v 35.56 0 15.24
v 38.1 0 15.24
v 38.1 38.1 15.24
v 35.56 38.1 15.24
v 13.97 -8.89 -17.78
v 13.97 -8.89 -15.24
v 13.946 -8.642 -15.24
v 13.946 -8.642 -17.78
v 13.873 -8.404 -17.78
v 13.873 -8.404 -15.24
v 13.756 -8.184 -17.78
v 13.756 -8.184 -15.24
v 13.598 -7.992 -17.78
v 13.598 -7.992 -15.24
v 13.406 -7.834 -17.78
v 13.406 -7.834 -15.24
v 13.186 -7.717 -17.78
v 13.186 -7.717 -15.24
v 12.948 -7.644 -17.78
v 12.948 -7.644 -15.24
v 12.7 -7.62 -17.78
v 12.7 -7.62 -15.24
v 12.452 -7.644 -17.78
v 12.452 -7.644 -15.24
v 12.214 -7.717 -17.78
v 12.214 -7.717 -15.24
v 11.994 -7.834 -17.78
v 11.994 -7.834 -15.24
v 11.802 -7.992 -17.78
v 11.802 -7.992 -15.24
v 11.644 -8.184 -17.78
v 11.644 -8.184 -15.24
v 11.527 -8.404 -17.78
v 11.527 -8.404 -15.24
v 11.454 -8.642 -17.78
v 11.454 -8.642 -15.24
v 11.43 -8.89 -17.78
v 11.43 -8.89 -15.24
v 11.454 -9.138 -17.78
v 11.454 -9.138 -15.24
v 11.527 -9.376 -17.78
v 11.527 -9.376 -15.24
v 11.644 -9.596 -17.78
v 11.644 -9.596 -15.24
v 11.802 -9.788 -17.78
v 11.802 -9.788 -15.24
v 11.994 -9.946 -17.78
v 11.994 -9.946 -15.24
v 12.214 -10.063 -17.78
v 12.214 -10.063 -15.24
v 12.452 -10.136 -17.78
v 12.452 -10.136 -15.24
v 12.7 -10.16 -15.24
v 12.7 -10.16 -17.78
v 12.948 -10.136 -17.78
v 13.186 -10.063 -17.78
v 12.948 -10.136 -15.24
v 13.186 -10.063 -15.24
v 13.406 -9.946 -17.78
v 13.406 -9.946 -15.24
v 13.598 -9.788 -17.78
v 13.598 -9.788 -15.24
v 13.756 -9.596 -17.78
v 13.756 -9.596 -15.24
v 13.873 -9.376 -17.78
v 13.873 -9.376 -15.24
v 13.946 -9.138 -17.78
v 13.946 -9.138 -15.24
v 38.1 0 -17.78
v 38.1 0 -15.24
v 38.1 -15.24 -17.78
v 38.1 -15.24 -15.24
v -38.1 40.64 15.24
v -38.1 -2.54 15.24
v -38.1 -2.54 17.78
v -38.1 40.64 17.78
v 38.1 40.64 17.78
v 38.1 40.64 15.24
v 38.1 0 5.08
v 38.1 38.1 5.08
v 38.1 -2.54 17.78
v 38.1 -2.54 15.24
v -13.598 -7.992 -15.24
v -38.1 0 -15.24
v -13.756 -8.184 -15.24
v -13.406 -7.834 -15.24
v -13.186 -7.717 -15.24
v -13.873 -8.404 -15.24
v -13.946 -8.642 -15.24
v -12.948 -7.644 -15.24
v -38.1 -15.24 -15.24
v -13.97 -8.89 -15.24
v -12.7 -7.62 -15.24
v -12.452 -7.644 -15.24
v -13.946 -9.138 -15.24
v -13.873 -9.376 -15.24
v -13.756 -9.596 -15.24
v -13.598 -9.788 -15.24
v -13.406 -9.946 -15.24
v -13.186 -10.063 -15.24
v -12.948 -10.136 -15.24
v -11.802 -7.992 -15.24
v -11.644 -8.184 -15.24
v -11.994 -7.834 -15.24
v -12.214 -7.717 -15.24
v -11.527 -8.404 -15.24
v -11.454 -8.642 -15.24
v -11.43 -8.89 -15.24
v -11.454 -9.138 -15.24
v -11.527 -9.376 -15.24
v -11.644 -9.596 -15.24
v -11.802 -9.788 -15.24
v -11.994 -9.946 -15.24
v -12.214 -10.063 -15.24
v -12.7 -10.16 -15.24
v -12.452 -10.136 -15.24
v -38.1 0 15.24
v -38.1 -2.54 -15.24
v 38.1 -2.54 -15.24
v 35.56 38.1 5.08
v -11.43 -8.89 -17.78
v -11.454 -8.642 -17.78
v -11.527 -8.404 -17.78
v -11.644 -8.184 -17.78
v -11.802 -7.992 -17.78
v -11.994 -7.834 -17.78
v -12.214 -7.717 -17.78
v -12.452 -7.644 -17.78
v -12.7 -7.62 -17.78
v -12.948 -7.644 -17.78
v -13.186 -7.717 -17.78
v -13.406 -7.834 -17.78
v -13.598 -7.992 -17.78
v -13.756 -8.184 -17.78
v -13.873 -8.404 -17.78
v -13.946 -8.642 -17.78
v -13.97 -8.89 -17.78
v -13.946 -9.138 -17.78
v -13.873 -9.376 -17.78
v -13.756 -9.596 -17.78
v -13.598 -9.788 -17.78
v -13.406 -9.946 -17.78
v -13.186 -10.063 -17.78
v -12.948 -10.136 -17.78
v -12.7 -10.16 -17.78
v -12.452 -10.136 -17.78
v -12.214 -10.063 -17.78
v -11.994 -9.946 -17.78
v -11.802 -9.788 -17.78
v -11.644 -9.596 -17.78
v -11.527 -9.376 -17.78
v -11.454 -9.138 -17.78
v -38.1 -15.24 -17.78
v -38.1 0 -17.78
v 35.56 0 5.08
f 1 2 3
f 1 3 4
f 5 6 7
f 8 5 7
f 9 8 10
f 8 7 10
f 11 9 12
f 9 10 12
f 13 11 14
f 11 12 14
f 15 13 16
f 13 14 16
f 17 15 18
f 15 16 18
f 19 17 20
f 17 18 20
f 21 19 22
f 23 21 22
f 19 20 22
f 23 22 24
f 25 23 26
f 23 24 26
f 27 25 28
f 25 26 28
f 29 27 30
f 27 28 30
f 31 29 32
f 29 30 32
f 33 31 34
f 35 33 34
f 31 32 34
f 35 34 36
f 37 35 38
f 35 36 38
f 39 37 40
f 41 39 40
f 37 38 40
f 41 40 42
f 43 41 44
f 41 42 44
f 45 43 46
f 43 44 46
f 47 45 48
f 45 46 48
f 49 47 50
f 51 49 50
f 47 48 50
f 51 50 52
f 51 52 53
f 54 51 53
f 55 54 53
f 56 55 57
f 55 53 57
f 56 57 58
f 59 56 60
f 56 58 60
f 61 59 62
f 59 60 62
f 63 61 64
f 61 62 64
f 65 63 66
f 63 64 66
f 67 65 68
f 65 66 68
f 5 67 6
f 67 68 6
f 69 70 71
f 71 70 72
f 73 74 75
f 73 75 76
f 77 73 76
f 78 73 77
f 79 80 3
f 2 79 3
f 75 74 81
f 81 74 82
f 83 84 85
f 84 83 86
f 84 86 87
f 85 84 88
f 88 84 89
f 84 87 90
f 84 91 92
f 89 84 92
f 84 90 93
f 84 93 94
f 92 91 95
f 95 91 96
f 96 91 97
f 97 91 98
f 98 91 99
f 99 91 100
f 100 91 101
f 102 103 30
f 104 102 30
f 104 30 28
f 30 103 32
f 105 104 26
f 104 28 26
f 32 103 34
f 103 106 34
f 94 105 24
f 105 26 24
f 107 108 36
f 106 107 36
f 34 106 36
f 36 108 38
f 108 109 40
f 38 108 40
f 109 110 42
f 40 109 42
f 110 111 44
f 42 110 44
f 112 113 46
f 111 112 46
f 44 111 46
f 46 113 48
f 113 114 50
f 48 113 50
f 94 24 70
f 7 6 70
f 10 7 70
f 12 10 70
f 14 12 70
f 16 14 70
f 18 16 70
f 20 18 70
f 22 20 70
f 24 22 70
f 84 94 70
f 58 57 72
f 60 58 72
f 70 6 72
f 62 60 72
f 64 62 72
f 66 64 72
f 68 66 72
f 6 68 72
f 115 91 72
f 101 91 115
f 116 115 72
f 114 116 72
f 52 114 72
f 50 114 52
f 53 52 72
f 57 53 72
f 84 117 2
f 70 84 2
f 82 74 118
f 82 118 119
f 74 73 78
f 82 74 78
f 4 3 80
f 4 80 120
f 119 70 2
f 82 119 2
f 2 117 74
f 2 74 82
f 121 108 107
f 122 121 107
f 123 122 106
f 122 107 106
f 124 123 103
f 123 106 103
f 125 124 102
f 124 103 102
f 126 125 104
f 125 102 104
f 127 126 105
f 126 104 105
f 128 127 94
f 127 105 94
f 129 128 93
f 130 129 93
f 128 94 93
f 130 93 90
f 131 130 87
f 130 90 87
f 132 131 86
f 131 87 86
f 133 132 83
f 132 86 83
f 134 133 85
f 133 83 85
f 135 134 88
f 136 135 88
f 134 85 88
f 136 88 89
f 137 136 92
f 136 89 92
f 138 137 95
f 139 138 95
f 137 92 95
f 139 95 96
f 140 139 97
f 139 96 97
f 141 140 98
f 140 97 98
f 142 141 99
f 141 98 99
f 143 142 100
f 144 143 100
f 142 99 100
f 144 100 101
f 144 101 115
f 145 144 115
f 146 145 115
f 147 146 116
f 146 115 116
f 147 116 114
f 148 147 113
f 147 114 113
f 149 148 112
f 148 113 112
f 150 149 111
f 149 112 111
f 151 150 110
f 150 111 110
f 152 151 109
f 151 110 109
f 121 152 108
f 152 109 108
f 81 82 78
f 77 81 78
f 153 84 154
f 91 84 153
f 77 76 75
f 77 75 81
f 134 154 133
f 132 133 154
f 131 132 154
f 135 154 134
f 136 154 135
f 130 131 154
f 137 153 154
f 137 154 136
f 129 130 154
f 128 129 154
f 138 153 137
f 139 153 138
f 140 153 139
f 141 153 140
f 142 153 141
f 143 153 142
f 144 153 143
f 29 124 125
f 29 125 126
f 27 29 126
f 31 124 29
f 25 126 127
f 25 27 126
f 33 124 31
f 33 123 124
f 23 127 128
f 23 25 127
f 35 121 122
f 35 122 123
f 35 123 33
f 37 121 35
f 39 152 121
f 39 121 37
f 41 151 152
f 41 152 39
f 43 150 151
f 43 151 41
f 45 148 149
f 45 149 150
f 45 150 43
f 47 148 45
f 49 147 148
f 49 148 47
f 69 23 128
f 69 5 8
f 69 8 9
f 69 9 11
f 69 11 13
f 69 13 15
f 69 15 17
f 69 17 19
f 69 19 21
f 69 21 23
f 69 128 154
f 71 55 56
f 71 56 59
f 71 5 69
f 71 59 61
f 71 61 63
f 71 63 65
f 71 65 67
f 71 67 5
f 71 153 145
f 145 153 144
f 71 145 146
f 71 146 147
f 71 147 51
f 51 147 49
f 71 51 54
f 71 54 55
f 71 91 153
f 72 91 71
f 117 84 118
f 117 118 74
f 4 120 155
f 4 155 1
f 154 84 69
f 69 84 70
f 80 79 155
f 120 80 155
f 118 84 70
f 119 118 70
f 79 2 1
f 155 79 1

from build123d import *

# Parameters (mm, degrees)
F0_W      = 76.2
F0_H      = 30.48
F1_DEPTH  = 2.54
F2_W      = 43.18
F2_H      = 10.16
F3_DEPTH  = 2.54
F5_W      = 2.54
F5_H      = 10.16
F6_DEPTH  = 38.1
F7_W      = 76.2
F7_H      = 43.18
F8_DEPTH  = 2.54
F9_W      = 76.2
F9_H      = 15.24
F10_DEPTH = 2.54
F11_R     = 1.27
F12_DEPTH = 2.54
F13_DEPTH = 2.54


with BuildPart() as f1:
    # F0 (on Front) → F1 (new body)
    with BuildSketch(Plane.XZ):
        Rectangle(F0_W, F0_H)
    extrude(amount=F1_DEPTH)

    # F11 (on face) → F13 (cut)
    with BuildSketch(Plane.XY.offset(-15.24)):
        with Locations((-12.7, -8.89)):
            Circle(F11_R)
        with Locations((12.7, -8.89)):
            Circle(F11_R)
    extrude(amount=-F13_DEPTH, mode=Mode.SUBTRACT)


with BuildPart() as f3:
    # F2 (on Right) → F3 (new body)
    with BuildSketch(Plane.YZ):
        Rectangle(F2_W, F2_H)
    extrude(amount=F3_DEPTH)


with BuildPart() as f6:
    # F5 (on face) → F6 (new body)
    with BuildSketch(Plane(origin=(0, 0, 0), x_dir=(-1, 0, 0), z_dir=(0, 1, 0))):
        with Locations((-36.83, 10.16)):
            Rectangle(F5_W, F5_H)
    extrude(amount=F6_DEPTH)


with BuildPart() as f8:
    # F7 (on face) → F8 (new body)
    with BuildSketch(Plane.XY.offset(15.24)):
        with Locations((0, 19.05)):
            Rectangle(F7_W, F7_H)
    extrude(amount=F8_DEPTH)


with BuildPart() as f10:
    # F9 (on face) → F10 (new body)
    with BuildSketch(Plane(origin=(0, 0, -15.24), x_dir=(1, 0, 0), z_dir=(0, 0, -1))):
        with Locations((0, 7.62)):
            Rectangle(F9_W, F9_H)
    extrude(amount=F10_DEPTH)

    # F11 (on face) → F12 (cut)
    with BuildSketch(Plane.XY.offset(-15.24)):
        with Locations((-12.7, -8.89)):
            Circle(F11_R)
        with Locations((12.7, -8.89)):
            Circle(F11_R)
    extrude(amount=-F12_DEPTH, mode=Mode.SUBTRACT)


solid = Compound([f1.part, f6.part, f8.part, f10.part])
